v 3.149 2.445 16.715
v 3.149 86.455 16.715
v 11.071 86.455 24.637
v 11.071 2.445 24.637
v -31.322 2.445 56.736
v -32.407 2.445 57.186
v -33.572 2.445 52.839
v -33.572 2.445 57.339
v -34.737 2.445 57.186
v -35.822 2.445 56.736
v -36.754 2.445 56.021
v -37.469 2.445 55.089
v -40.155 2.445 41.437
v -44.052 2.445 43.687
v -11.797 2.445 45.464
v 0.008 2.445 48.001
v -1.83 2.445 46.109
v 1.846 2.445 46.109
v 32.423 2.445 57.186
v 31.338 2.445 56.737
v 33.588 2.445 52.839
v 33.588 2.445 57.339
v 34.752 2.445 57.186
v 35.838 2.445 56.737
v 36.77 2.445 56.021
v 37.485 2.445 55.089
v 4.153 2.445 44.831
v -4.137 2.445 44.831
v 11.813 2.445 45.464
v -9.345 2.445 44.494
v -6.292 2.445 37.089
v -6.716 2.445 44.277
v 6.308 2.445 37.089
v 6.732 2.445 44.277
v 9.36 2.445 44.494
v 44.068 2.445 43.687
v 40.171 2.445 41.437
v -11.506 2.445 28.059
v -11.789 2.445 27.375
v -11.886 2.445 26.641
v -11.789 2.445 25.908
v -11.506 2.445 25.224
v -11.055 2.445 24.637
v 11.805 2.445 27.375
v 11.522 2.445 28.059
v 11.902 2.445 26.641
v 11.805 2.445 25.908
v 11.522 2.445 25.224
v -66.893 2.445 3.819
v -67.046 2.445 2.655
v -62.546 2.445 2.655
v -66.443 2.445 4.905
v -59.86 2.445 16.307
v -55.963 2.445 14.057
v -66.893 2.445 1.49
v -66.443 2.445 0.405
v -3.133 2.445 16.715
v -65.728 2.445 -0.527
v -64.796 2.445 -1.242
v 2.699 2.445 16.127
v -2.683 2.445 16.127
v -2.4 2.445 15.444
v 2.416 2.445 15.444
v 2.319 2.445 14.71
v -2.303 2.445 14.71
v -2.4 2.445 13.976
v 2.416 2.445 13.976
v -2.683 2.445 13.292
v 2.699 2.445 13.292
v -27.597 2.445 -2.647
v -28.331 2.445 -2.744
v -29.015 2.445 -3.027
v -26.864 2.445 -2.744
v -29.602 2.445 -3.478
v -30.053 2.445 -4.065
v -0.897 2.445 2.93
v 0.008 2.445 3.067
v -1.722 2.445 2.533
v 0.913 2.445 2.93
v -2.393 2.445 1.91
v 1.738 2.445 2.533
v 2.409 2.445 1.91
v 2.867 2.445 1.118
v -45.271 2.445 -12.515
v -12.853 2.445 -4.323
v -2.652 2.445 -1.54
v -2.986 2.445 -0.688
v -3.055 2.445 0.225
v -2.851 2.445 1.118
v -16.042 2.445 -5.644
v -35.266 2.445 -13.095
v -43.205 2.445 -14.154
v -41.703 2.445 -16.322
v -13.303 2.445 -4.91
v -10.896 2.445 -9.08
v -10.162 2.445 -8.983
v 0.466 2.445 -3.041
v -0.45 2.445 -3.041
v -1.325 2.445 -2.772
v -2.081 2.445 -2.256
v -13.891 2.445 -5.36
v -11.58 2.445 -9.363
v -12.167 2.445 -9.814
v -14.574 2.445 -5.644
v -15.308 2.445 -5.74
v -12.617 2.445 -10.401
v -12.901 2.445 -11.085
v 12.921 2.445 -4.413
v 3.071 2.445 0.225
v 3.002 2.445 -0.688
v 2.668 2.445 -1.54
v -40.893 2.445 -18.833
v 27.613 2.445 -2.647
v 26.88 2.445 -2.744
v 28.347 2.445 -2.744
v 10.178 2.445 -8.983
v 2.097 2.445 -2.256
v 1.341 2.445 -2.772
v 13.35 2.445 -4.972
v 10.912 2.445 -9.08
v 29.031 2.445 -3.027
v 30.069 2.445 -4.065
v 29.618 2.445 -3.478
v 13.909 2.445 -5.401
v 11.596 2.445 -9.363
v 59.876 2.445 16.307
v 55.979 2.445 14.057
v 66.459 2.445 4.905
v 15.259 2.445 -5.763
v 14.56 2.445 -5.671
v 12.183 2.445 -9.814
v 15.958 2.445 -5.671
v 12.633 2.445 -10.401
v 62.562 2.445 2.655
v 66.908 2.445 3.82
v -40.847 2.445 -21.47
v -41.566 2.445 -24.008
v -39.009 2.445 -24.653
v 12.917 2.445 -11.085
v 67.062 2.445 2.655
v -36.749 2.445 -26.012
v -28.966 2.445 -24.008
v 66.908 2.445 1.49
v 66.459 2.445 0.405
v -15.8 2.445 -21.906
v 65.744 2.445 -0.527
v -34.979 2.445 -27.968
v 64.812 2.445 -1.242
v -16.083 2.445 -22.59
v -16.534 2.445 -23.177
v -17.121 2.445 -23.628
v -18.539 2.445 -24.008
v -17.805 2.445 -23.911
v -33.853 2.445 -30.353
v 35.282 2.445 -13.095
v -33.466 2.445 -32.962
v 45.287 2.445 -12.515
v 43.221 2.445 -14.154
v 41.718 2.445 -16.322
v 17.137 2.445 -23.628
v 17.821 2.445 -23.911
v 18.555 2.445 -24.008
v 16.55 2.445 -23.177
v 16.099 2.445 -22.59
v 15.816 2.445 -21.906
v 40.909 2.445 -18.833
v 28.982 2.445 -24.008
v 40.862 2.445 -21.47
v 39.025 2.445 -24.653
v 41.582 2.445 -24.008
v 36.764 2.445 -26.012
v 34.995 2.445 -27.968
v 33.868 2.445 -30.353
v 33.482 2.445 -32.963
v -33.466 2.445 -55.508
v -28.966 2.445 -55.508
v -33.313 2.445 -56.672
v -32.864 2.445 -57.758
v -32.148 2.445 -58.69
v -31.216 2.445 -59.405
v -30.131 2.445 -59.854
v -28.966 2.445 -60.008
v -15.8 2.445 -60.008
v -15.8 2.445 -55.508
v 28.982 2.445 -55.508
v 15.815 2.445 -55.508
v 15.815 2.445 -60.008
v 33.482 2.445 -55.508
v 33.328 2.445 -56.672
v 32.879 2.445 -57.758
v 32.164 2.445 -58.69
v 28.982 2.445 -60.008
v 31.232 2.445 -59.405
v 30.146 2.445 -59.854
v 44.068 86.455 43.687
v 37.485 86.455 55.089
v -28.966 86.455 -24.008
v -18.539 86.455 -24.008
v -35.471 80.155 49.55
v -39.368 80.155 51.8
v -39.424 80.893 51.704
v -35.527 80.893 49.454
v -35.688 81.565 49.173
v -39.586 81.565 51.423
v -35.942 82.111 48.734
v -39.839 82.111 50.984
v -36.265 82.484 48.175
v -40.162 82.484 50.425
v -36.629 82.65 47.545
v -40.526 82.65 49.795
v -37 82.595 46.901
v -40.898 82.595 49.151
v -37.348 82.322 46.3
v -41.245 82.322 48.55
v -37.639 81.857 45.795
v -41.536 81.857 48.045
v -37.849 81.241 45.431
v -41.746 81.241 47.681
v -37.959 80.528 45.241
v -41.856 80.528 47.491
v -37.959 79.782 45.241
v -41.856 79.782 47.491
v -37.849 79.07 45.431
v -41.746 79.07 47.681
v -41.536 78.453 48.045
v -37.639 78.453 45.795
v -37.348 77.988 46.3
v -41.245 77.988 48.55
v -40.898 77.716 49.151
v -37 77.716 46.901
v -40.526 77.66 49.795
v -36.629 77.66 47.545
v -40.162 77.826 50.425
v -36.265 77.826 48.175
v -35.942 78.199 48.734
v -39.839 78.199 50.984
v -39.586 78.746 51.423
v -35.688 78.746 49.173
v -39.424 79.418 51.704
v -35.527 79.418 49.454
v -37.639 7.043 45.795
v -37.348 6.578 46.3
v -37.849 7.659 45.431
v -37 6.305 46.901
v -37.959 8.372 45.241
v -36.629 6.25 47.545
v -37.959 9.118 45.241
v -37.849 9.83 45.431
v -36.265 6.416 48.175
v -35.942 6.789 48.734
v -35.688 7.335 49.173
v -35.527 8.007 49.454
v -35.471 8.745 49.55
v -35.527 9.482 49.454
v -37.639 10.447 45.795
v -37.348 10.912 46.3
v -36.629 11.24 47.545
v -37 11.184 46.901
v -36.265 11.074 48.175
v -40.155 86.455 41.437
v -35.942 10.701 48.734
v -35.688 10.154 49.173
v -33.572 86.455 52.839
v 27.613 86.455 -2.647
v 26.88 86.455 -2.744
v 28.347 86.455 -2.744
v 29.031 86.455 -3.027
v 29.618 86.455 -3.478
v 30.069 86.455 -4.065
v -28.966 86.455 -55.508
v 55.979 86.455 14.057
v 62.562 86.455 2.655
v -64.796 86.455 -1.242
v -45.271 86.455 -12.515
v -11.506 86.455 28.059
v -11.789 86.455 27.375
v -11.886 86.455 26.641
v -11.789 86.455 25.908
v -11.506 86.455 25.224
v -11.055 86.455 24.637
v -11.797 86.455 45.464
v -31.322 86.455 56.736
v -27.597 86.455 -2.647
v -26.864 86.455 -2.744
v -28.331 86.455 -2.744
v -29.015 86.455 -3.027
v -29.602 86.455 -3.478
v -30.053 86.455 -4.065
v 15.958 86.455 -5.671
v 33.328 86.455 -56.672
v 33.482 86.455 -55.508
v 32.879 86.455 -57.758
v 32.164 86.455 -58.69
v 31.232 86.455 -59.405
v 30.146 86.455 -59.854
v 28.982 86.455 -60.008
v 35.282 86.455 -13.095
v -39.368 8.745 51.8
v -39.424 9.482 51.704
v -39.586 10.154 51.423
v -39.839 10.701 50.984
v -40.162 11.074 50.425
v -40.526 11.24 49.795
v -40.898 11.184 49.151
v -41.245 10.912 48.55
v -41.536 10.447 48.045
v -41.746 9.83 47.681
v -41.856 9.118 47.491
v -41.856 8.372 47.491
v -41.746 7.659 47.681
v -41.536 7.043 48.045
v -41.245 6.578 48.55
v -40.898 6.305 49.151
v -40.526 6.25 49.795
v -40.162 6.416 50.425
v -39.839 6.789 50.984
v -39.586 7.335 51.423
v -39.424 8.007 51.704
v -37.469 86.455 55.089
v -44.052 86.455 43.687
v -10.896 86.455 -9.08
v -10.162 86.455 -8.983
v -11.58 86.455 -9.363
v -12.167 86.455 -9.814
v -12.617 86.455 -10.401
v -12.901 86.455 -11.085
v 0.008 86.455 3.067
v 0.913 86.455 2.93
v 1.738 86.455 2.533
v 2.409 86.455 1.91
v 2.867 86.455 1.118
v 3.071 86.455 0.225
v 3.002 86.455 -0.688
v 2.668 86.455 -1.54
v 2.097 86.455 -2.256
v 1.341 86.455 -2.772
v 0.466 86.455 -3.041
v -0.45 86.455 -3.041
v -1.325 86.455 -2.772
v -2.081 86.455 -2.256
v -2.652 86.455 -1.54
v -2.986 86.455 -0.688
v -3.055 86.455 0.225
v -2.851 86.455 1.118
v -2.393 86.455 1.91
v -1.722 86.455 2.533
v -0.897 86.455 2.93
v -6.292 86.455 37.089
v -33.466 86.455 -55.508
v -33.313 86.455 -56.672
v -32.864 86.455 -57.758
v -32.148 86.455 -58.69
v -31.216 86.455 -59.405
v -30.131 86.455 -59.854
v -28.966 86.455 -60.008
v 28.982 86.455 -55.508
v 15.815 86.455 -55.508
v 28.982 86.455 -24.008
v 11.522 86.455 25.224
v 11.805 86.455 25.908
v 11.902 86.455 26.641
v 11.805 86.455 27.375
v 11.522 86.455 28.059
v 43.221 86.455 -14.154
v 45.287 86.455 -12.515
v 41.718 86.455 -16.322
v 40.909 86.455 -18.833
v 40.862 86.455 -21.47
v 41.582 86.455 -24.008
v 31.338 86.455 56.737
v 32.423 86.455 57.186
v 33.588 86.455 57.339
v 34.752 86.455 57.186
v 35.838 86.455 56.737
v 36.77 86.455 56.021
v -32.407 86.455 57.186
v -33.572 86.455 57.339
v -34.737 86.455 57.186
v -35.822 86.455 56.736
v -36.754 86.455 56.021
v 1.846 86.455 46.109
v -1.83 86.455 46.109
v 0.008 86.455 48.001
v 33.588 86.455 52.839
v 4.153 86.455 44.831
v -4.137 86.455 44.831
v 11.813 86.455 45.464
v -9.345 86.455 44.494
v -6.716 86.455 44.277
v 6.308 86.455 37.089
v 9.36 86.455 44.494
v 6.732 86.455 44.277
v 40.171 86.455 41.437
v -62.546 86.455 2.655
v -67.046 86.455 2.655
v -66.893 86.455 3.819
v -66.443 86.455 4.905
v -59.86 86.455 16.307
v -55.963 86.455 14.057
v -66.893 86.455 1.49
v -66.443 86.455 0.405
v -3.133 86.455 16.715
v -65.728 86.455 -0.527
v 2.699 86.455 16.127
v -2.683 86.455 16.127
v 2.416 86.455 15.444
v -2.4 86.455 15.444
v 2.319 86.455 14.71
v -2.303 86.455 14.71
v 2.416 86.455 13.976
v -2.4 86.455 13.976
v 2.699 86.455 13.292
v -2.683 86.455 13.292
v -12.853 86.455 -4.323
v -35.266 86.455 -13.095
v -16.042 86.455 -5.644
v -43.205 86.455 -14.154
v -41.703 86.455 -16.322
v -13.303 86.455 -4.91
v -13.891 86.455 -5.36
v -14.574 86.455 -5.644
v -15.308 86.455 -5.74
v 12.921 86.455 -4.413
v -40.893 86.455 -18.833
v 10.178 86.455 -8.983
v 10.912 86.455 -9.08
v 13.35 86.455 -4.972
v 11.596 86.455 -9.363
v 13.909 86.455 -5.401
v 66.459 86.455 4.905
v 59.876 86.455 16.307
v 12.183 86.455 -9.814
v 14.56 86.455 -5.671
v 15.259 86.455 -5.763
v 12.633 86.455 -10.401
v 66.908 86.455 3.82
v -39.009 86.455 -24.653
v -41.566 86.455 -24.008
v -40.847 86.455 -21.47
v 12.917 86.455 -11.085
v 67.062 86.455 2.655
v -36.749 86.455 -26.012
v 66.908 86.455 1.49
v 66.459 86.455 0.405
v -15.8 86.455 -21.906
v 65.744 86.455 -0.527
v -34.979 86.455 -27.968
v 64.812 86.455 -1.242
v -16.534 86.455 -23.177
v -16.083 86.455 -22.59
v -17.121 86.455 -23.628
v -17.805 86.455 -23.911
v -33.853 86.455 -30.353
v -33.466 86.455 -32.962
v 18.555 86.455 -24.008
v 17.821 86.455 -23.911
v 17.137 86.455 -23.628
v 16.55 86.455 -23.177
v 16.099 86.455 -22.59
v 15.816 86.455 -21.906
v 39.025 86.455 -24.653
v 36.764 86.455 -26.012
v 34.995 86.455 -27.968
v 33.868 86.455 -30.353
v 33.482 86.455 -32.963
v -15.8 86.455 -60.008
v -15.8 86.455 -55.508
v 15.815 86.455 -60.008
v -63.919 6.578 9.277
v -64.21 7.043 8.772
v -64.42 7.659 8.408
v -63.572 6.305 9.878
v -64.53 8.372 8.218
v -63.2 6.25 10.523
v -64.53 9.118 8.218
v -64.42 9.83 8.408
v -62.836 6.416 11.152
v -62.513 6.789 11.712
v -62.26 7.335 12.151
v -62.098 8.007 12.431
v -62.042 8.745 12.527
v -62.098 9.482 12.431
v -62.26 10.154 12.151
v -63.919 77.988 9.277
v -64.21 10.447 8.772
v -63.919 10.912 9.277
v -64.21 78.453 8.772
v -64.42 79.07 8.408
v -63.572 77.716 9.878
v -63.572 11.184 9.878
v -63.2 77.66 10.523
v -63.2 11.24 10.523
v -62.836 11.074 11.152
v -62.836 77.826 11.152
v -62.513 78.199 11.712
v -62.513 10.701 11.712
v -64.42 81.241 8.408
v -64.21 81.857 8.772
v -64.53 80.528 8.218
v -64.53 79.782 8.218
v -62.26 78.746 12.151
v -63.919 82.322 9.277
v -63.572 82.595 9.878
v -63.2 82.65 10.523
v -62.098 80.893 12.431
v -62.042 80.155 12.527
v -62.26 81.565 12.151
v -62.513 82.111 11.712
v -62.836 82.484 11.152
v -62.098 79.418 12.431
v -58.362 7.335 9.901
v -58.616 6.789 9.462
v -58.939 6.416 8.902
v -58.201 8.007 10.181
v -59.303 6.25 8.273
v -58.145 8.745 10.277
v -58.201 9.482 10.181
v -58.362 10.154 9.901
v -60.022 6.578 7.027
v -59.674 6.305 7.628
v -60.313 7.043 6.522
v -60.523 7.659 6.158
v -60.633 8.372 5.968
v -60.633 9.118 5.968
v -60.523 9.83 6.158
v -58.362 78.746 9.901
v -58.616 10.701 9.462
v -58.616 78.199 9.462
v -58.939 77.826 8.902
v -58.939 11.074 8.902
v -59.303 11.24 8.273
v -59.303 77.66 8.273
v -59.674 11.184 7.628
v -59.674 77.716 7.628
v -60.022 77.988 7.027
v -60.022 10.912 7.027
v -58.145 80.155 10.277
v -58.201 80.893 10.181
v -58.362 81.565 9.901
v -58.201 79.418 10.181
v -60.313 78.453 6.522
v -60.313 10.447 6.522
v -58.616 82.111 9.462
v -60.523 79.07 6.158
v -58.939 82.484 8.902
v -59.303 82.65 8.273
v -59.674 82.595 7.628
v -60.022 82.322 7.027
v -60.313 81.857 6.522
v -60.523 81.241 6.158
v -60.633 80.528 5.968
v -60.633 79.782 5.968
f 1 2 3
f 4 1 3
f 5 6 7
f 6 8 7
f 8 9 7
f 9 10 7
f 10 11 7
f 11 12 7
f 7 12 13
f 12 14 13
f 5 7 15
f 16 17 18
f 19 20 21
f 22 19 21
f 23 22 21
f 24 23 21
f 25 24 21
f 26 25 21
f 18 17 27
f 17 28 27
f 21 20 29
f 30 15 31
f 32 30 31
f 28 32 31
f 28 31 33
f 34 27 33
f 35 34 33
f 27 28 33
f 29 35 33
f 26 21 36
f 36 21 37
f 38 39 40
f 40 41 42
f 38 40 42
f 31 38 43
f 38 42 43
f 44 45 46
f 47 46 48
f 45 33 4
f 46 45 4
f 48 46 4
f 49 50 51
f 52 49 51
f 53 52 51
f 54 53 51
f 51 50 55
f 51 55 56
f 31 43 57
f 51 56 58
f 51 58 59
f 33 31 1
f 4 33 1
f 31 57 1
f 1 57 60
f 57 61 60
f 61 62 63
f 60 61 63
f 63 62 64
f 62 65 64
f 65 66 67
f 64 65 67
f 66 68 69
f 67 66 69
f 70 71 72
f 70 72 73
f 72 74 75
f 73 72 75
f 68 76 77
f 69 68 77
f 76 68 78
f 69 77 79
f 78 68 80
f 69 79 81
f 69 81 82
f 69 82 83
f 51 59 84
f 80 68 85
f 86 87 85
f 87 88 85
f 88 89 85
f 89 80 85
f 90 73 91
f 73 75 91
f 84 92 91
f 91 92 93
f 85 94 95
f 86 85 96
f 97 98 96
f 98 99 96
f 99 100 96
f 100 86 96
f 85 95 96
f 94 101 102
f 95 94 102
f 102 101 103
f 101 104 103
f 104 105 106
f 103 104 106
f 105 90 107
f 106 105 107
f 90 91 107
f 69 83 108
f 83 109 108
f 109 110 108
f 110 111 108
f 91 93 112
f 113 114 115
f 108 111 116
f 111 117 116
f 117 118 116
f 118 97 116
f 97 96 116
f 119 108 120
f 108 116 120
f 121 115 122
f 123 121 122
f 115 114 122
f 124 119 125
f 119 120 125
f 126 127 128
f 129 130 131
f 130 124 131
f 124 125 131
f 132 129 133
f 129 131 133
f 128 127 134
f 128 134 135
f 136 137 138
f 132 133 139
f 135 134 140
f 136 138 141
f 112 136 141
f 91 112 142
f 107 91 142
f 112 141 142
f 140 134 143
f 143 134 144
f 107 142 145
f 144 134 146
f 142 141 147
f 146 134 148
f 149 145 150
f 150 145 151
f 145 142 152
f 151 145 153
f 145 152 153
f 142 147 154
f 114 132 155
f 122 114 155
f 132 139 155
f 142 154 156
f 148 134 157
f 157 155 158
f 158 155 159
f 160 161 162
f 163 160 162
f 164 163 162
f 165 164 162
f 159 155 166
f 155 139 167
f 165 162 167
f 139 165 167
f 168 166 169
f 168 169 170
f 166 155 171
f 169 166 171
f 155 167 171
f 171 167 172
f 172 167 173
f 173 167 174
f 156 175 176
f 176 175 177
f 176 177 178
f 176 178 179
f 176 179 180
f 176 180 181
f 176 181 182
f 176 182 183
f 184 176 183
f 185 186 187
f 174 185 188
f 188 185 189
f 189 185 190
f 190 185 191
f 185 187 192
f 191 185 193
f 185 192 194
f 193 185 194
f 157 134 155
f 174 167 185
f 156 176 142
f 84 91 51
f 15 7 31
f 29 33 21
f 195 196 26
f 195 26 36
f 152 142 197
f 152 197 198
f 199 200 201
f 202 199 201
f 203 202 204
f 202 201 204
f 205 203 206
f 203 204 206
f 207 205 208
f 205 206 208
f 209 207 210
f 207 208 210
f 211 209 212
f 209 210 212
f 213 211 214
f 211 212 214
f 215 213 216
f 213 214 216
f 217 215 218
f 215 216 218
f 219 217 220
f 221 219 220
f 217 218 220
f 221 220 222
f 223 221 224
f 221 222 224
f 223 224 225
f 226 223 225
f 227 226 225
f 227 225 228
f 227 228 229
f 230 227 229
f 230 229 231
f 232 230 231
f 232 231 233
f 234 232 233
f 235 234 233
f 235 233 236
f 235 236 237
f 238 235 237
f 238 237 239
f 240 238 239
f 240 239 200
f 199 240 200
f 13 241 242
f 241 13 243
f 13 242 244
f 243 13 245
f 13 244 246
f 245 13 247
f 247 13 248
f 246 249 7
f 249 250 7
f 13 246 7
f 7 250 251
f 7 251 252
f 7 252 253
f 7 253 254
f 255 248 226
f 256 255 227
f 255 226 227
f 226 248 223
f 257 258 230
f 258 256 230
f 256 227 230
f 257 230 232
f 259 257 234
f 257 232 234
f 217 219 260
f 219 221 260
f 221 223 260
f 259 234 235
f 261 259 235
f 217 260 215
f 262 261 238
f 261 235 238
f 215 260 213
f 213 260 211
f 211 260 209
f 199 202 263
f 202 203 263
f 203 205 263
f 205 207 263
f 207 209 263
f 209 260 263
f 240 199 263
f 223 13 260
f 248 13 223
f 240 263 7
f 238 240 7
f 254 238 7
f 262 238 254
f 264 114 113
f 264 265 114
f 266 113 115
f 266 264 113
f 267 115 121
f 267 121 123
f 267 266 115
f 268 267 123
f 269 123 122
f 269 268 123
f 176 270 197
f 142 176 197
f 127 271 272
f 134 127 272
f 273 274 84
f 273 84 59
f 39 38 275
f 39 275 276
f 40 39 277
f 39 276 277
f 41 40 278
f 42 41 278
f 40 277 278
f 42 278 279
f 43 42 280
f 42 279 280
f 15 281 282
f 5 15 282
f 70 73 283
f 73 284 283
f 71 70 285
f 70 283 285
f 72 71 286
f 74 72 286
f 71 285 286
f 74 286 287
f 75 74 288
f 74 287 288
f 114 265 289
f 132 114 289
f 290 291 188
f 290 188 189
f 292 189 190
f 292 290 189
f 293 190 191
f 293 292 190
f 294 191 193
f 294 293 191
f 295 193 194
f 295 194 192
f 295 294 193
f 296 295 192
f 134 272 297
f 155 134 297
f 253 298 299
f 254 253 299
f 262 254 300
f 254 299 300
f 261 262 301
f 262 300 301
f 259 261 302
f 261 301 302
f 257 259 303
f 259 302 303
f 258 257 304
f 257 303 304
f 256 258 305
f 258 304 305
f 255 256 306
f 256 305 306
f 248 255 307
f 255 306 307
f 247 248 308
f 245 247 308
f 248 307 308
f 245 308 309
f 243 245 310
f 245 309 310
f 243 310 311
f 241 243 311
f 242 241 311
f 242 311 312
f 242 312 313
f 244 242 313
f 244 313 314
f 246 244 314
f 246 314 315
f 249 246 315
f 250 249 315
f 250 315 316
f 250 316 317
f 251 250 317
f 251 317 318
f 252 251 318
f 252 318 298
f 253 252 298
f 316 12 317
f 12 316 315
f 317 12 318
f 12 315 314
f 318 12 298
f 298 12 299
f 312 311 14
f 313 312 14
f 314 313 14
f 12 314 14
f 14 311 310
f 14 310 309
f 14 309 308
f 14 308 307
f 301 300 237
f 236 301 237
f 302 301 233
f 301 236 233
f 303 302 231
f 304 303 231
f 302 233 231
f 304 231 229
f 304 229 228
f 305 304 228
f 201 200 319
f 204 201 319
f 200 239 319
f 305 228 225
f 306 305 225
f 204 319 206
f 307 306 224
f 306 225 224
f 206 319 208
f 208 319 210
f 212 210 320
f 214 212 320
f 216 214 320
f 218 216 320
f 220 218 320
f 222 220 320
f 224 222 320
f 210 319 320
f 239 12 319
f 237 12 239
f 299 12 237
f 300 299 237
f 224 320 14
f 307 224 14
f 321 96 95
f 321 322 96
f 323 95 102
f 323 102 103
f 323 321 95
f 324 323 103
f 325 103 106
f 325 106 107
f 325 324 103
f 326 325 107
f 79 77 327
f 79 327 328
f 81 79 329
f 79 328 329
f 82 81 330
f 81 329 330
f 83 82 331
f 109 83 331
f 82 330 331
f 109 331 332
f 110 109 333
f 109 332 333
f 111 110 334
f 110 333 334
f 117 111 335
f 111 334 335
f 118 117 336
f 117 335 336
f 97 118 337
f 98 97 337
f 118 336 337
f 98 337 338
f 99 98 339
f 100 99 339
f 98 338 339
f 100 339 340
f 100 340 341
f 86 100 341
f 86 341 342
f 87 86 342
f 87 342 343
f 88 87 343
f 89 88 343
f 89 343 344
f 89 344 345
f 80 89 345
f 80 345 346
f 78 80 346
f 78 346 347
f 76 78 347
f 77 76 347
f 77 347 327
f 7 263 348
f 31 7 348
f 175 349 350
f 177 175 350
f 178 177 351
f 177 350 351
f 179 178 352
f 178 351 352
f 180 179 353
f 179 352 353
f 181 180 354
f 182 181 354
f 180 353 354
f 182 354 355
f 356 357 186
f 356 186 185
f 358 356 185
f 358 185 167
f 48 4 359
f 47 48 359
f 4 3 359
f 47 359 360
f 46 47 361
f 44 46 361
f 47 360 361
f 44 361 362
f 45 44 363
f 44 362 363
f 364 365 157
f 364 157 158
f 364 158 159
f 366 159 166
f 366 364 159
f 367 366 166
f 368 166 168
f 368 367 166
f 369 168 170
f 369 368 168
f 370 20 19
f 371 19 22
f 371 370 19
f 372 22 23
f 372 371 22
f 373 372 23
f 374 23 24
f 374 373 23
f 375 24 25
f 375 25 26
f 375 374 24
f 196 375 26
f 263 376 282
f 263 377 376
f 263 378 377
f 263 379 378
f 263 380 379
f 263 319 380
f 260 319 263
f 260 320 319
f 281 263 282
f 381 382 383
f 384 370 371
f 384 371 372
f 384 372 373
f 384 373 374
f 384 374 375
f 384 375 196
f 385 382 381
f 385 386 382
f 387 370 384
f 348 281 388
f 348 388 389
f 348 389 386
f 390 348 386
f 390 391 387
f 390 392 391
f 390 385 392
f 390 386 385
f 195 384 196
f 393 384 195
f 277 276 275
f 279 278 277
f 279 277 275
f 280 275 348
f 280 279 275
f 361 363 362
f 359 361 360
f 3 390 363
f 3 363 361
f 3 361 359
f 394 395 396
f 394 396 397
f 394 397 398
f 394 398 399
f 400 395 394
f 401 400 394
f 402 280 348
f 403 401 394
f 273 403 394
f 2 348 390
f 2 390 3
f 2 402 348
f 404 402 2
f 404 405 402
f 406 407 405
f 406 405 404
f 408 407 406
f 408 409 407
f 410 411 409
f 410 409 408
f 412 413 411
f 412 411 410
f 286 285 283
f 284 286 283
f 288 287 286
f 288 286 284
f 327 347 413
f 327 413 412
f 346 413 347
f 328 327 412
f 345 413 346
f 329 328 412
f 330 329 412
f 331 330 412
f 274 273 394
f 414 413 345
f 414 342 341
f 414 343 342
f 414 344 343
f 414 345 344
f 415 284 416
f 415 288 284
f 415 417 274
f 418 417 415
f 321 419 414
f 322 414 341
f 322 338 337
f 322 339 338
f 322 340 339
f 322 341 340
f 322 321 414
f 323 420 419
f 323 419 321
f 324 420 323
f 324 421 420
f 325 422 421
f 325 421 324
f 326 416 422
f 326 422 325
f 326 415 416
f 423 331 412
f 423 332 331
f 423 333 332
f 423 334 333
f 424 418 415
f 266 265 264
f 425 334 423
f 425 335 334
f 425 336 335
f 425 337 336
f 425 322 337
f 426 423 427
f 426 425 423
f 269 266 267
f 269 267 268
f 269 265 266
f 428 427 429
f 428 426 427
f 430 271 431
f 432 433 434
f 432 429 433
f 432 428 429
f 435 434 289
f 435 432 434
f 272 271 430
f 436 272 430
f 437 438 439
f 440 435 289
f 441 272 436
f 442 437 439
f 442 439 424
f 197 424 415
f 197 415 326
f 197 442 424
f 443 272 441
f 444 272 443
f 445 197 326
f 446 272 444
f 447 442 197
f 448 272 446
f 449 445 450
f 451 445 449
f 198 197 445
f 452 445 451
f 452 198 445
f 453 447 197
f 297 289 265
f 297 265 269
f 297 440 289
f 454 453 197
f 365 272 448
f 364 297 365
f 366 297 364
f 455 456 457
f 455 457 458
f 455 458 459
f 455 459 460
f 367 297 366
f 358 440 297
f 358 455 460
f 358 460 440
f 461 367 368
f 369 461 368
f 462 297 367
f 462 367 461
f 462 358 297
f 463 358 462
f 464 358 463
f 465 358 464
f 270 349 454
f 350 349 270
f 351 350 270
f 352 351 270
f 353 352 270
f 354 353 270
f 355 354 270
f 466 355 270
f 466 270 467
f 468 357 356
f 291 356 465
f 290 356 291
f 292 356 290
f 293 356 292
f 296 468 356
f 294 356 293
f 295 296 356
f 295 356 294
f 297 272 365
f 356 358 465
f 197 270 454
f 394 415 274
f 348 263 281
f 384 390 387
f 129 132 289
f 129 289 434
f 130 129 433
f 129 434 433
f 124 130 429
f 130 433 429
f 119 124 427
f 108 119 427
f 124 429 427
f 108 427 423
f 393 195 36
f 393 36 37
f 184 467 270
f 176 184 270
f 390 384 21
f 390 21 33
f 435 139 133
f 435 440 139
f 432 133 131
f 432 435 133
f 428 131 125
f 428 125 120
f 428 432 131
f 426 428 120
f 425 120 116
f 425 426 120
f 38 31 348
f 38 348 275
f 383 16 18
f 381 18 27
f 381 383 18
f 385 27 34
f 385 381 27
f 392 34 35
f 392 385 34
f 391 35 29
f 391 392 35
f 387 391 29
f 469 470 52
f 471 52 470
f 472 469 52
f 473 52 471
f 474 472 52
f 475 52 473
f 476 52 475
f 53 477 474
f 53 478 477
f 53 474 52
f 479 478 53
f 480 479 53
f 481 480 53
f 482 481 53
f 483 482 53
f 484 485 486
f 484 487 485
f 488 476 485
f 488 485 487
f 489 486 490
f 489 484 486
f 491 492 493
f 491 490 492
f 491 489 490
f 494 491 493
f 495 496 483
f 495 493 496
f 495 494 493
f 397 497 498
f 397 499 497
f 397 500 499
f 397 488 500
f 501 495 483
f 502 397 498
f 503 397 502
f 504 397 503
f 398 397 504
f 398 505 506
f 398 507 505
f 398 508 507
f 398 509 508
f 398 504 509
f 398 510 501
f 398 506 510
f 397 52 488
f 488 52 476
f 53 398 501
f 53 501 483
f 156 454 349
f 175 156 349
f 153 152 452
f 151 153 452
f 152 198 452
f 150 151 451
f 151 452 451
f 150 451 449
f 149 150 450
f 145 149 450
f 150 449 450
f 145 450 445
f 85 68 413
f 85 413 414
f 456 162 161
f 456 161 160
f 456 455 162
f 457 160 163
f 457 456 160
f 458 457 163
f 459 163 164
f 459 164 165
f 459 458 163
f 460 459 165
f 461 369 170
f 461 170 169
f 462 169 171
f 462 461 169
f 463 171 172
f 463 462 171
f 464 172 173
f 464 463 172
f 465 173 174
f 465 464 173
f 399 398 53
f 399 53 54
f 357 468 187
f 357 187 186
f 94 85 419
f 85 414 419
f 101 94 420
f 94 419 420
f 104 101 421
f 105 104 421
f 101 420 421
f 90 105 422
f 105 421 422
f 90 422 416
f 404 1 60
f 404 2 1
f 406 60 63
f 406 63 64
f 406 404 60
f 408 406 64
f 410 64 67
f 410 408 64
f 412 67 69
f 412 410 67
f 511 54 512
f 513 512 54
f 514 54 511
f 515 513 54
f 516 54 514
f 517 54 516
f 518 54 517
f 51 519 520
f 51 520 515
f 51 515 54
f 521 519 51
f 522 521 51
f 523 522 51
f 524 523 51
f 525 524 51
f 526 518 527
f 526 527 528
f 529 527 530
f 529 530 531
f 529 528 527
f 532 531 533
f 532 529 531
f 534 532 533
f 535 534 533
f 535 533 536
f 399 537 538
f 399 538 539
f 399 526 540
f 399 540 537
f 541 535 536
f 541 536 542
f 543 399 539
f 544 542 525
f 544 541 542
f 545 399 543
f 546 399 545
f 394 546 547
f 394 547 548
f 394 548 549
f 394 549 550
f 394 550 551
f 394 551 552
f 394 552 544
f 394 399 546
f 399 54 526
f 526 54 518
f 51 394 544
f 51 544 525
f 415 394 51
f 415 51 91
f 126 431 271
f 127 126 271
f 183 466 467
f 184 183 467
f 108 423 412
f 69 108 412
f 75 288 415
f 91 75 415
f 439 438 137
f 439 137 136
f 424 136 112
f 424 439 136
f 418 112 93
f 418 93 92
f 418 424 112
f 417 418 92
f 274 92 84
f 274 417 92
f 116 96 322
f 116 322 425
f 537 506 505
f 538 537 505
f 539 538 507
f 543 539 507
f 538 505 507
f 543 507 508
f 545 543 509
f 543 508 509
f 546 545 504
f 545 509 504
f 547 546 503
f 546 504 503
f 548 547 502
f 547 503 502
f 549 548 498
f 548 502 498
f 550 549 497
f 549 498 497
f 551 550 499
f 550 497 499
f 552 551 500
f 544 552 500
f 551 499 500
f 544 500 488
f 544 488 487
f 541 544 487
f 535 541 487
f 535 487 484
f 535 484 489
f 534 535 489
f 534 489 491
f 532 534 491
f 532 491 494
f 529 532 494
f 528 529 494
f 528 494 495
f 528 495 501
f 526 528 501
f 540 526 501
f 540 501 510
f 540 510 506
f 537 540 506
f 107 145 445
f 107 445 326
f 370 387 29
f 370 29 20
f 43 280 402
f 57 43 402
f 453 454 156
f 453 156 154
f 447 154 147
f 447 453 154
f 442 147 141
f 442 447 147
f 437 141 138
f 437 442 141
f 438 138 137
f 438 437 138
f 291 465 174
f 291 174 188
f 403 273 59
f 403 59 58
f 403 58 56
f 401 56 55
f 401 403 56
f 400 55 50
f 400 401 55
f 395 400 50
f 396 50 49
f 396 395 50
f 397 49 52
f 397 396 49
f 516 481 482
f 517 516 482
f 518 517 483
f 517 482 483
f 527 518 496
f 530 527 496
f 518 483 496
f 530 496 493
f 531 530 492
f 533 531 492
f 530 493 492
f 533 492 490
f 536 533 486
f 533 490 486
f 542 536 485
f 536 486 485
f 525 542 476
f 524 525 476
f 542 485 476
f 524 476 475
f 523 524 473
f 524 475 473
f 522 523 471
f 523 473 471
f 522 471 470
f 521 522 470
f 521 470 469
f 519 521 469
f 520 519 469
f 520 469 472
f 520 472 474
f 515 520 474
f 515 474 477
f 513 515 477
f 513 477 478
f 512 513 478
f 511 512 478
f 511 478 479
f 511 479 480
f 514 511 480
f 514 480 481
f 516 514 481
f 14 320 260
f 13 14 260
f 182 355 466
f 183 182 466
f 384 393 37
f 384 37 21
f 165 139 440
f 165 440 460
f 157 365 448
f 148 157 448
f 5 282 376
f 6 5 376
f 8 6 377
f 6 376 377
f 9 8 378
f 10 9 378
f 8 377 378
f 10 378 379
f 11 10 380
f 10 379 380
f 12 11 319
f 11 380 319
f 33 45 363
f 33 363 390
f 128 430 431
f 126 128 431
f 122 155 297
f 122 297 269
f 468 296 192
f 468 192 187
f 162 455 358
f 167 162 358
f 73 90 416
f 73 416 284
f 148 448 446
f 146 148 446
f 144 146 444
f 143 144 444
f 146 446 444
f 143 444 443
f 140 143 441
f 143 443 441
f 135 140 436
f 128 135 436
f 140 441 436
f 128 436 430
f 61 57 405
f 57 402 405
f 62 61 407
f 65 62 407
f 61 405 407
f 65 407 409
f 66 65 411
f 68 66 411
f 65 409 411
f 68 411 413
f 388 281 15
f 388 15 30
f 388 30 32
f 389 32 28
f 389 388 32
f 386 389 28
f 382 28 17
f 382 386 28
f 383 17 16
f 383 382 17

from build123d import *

# Parameters (mm, degrees)
SALIENTE_EXTRUIR1_DEPTH = 88.9
CROQUIS4_R              = 3.25
CORTAR_EXTRUIR1_DEPTH   = 112.44204772
REDONDEO6_R             = 3
REDONDEO7_R             = 3
ESCALA2_SCALE           = 1.05
SALIENTE_EXTRUIR2_DEPTH = 93.345
REDONDEO8_R             = 10
REDONDEO9_R             = 10
REDONDEO12_R            = 10
REDONDEO13_R            = 10
REDONDEO14_R            = 10
REDONDEO16_R            = 10
REDONDEO17_R            = 3
CROQUIS20_R             = 2.78
CORTAR_EXTRUIR7_DEPTH   = 10
ESCALA3_SCALE           = 0.9


with BuildPart() as part:
    # Croquis1 → Saliente-Extruir1 (new body)
    with BuildSketch(Plane(origin=(0, 0, 0), x_dir=(1, 0, 0), z_dir=(0, 1, 0))):
        Polygon((1.696358741, -16.064461222), (13.335, -27.703102481), (0, -50.8), (-13.335, -27.703102481), (-1.696358741, -16.064461222), (-14.760410887, 6.563140847), (-30.659090512, 2.303102481), (-43.994090512, 25.4), (-17.324090512, 25.4), (-13.064052146, 9.501320374), (13.064052146, 9.501320374), (17.324090512, 25.4), (43.994090512, 25.4), (30.659090512, 2.303102481), (14.760410887, 6.563140847), align=None)
    extrude(amount=SALIENTE_EXTRUIR1_DEPTH)

    # Croquis4 → Cortar-Extruir1 (cut, through all)
    with BuildSketch(Plane(origin=(0, 88.9, 0), x_dir=(1, 0, 0), z_dir=(0, 1, 0))):
        with Locations(Location((0, 0, 0), (0, 0, 270))):
            Circle(CROQUIS4_R)
    extrude(amount=-CORTAR_EXTRUIR1_DEPTH, mode=Mode.SUBTRACT)

    # Redondeo6
    redondeo6_edges = [part.edges().sort_by_distance(p)[0] for p in [
        (-1.696358741, 44.45, 16.064461222),
        (-14.760410887, 44.45, -6.563140847),
        (-13.064052146, 44.45, -9.501320374),
        (13.064052146, 44.45, -9.501320374),
        (1.696358741, 44.45, 16.064461222),
    ]]
    fillet(redondeo6_edges, radius=REDONDEO6_R)

    # Redondeo7
    redondeo7_edges = [part.edges().sort_by_distance(p)[0] for p in [
        (-13.335, 44.45, 27.703102481),
        (-30.659090512, 44.45, -2.303102481),
        (-17.324090512, 44.45, -25.4),
        (17.324090512, 44.45, -25.4),
        (30.659090512, 44.45, -2.303102481),
        (13.335, 44.45, 27.703102481),
    ]]
    fillet(redondeo7_edges, radius=REDONDEO7_R)


with BuildPart() as part_1:
    # Escala2: scaled about (-0.00814633, 44.45, 0.003262785)
    add(part.part.scale(ESCALA2_SCALE).moved(Location((0.000407317, -2.2225, -0.000163139))))

    # Croquis9 → Saliente-Extruir2 (add, through all)
    with BuildSketch(Plane(origin=(0, 91.1225, 0), x_dir=(1, 0, 0), z_dir=(0, 1, 0))):
        with BuildLine():
            Line((-37.193388788, 26.670163139), (-37.193388788, 61.670162712))
            ThreePointArc((-37.193388788, 61.670162712), (-35.728922694, 65.205696618), (-32.193388788, 66.670162712))
            Line((-32.193388788, 66.670162712), (-17.564301381, 66.670162712))
            Line((-17.564301381, 66.670162712), (-17.564301381, 61.670162712))
            Line((-17.564301381, 61.670162712), (-32.193388788, 61.670162712))
            Line((-32.193388788, 61.670162712), (-32.193388788, 26.670163139))
            Line((-32.193388788, 26.670163139), (-37.193388788, 26.670163139))
        make_face()
        with BuildLine():
            Line((-69.504104547, -2.954490104), (-39.193215784, 14.545509683))
            Line((-39.193215784, 14.545509683), (-41.693215784, 18.875636702))
            Line((-41.693215784, 18.875636702), (-72.004104547, 1.375636915))
            ThreePointArc((-72.004104547, 1.375636915), (-74.333733678, -1.660394878), (-73.834231566, -5.454490104))
            Line((-73.834231566, -5.454490104), (-66.519687862, -18.123651433))
            Line((-66.519687862, -18.123651433), (-62.189560843, -15.623651433))
            Line((-62.189560843, -15.623651433), (-69.504104547, -2.954490104))
        make_face()
        with BuildLine():
            Line((32.193388788, 61.670162712), (32.193388788, 26.670163139))
            Line((32.193388788, 26.670163139), (37.193388788, 26.670163139))
            Line((37.193388788, 26.670163139), (37.193388788, 61.670162712))
            ThreePointArc((37.193388788, 61.670162712), (35.728922694, 65.205696618), (32.193388788, 66.670162712))
            Line((32.193388788, 66.670162712), (17.564301381, 66.670162712))
            Line((17.564301381, 66.670162712), (17.564301381, 61.670162712))
            Line((17.564301381, 61.670162712), (32.193388788, 61.670162712))
        make_face()
        with BuildLine():
            Line((39.193733196, 14.545210955), (41.693733196, 18.875337974))
            Line((41.693733196, 18.875337974), (72.004621958, 1.375338188))
            ThreePointArc((72.004621958, 1.375338188), (74.33425109, -1.660693606), (73.834748977, -5.454788831))
            Line((73.834748977, -5.454788831), (66.520205273, -18.123950161))
            Line((66.520205273, -18.123950161), (62.190078254, -15.623950161))
            Line((62.190078254, -15.623950161), (69.504621958, -2.954788831))
            Line((69.504621958, -2.954788831), (39.193733196, 14.545210955))
        make_face()
        with BuildLine():
            Line((37.31123317, -58.715373881), (7.000344407, -41.215374094))
            Line((7.000344407, -41.215374094), (4.500344407, -45.545501113))
            Line((4.500344407, -45.545501113), (34.81123317, -63.0455009))
            ThreePointArc((34.81123317, -63.0455009), (38.605328395, -63.545003012), (41.641360189, -61.215373881))
            Line((41.641360189, -61.215373881), (48.955903893, -48.546212551))
            Line((48.955903893, -48.546212551), (44.625776874, -46.046212551))
            Line((44.625776874, -46.046212551), (37.31123317, -58.715373881))
        make_face()
        with BuildLine():
            Line((-6.999826996, -41.215075367), (-4.499826996, -45.545202386))
            Line((-4.499826996, -45.545202386), (-34.810715758, -63.045202172))
            ThreePointArc((-34.810715758, -63.045202172), (-38.604810984, -63.544704284), (-41.640842777, -61.215075153))
            Line((-41.640842777, -61.215075153), (-48.955386481, -48.545913824))
            Line((-48.955386481, -48.545913824), (-44.625259462, -46.045913824))
            Line((-44.625259462, -46.045913824), (-37.310715758, -58.715075153))
            Line((-37.310715758, -58.715075153), (-6.999826996, -41.215075367))
        make_face()
    extrude(amount=-SALIENTE_EXTRUIR2_DEPTH)

    # Redondeo8
    # the kernel refuses this fillet: 10 mm, written as the material it adds along each edge
    with BuildSketch(Plane(origin=(-37.193388788, 91.1225, -26.670163139), x_dir=(-1, 0, 0), z_dir=(0, -1, 0))) as redondeo8_piece_1_section:
        with BuildLine():
            CenterArc((10, 9.949874264), REDONDEO8_R, 180, 84.260823378)
            Line((0, 9.949874264), (-0.2, 9.949874264))
            Line((-0.2, 9.949874264), (-0.2, 0))
            Line((-0.2, 0), (0, -0.2))
            ThreePointArc((0, -0.2), (4.499999466, -0.2), (8.979998912, -0.198997485))
            Line((8.979998912, -0.198997485), (8.999998933, 0))
        make_face()
    redondeo8_piece_1 = extrude(amount=93.345, mode=Mode.PRIVATE)
    redondeo8_piece_1 = split(redondeo8_piece_1, bisect_by=Plane(origin=(-45.471806186, 44.45, -25.420347259), z_dir=(0.8660254037844427, 0, -0.49999999999999306)), keep=Keep.TOP, mode=Mode.PRIVATE)
    add(redondeo8_piece_1)

    # Redondeo9
    # the kernel refuses this fillet: 10 mm, written as the material it adds along each edge
    with BuildSketch(Plane(origin=(37.193388788, 91.1225, -26.670163139), x_dir=(0, 0, -1), z_dir=(0, -1, 0))) as redondeo9_piece_1_section:
        with BuildLine():
            CenterArc((9.949956104, 10), REDONDEO9_R, 185.734485624, 84.265514376)
            Line((0, 9.000813566), (-0.198999122, 8.980829837))
            ThreePointArc((-0.198999122, 8.980829837), (-0.2, 4.500406783), (-0.2, 0))
            Line((-0.2, 0), (0, -0.2))
            Line((0, -0.2), (9.949956104, -0.2))
            Line((9.949956104, -0.2), (9.949956104, 0))
        make_face()
    redondeo9_piece_1 = extrude(amount=93.345, mode=Mode.PRIVATE)
    redondeo9_piece_1 = split(redondeo9_piece_1, bisect_by=Plane(origin=(45.472441412, 44.45, -25.420036516), z_dir=(-0.8660254037844312, 0, -0.5000000000000131)), keep=Keep.TOP, mode=Mode.PRIVATE)
    add(redondeo9_piece_1)

    # Redondeo12
    # the kernel refuses this fillet: 10 mm, written as the material it adds along each edge
    with BuildSketch(Plane(origin=(4.500437971, 91.1225, 45.545555132), x_dir=(0.8660254037844384, 0, 0.5000000000000003), z_dir=(0, -1, 0))) as redondeo12_piece_1_section:
        with BuildLine():
            CenterArc((9.949880533, 10), REDONDEO12_R, 185.738817437, 84.261182563)
            Line((0, 9.000061308), (-0.198997611, 8.980062535))
            ThreePointArc((-0.198997611, 8.980062535), (-0.2, 4.500030654), (-0.2, 0))
            Line((-0.2, 0), (0, -0.2))
            Line((0, -0.2), (9.949880533, -0.2))
            Line((9.949880533, -0.2), (9.949880533, 0))
        make_face()
    redondeo12_piece_1 = extrude(amount=93.345, mode=Mode.PRIVATE)
    redondeo12_piece_1 = split(redondeo12_piece_1, bisect_by=Plane(origin=(-0.721187955, 44.45, 52.089997188), z_dir=(0.8660254037844385, 0, -0.5000000000000004)), keep=Keep.TOP, mode=Mode.PRIVATE)
    add(redondeo12_piece_1)

    # Redondeo13
    # the kernel refuses this fillet: 10 mm, written as the material it adds along each edge
    with BuildSketch(Plane(origin=(41.693826759, 91.1225, -18.875283955), x_dir=(0.500000000000013, 0, -0.8660254037844312), z_dir=(0, -1, 0))) as redondeo13_piece_1_section:
        with BuildLine():
            CenterArc((10, 9.94994984), REDONDEO13_R, 180, 84.265155193)
            Line((0, 9.94994984), (-0.2, 9.94994984))
            Line((-0.2, 9.94994984), (-0.2, 0))
            Line((-0.2, 0), (0, -0.2))
            ThreePointArc((0, -0.2), (4.500375595, -0.2), (8.980766214, -0.198998997))
            Line((8.980766214, -0.198998997), (9.00075119, 0))
        make_face()
    redondeo13_piece_1 = extrude(amount=93.345, mode=Mode.PRIVATE)
    redondeo13_piece_1 = redondeo13_piece_1 - Plane(origin=(47.193388788, 44.45, -36.620119243), x_dir=(0, 0, -1), z_dir=(0, 1, 0)) * Cylinder(10, 227, mode=Mode.PRIVATE)
    add(redondeo13_piece_1)

    # Redondeo14
    # the kernel refuses this fillet: 10 mm, written as the material it adds along each edge
    with BuildSketch(Plane(origin=(-4.499826996, 91.1225, 45.545202386), x_dir=(0.4999999999984365, 0, 0.8660254037853413), z_dir=(0, -1, 0))) as redondeo14_piece_1_section:
        with BuildLine():
            CenterArc((10, 9.949921458), REDONDEO14_R, 180, 84.263528066)
            Line((0, 9.949921459), (-0.2, 9.949921459))
            Line((-0.2, 9.949921459), (-0.2, 0))
            Line((-0.2, 0), (0, -0.2))
            ThreePointArc((0, -0.2), (4.500234312, -0.2), (8.980477997, -0.198998429))
            Line((8.980477997, -0.198998429), (9.000468625, 0))
        make_face()
    redondeo14_piece_1 = extrude(amount=93.345, mode=Mode.PRIVATE)
    redondeo14_piece_1 = redondeo14_piece_1 - Plane(origin=(8.117287277, 44.45, 59.180749436), x_dir=(0.866025403784329, 0, 0.50000000000019), z_dir=(0, 1, 0)) * Cylinder(10, 227, mode=Mode.PRIVATE)
    add(redondeo14_piece_1)

    # Redondeo16
    # the kernel refuses this fillet: 10 mm, written as the material it adds along each edge
    with BuildSketch(Plane(origin=(-41.693215784, 91.1225, -18.875636702), x_dir=(-0.8660254037844388, 0, 0.4999999999999999), z_dir=(0, -1, 0))) as redondeo16_piece_1_section:
        with BuildLine():
            CenterArc((9.949908926, 10), REDONDEO16_R, 185.737190303, 84.262809697)
            Line((0, 9.000343874), (-0.198998178, 8.980350751))
            ThreePointArc((-0.198998178, 8.980350751), (-0.2, 4.500171937), (-0.2, 0))
            Line((-0.2, 0), (0, -0.2))
            Line((0, -0.2), (9.949908926, -0.2))
            Line((9.949908926, -0.2), (9.949908926, 0))
        make_face()
    redondeo16_piece_1 = extrude(amount=93.345, mode=Mode.PRIVATE)
    redondeo16_piece_1 = redondeo16_piece_1 - Plane(origin=(-47.193388788, 44.45, -36.620037403), x_dir=(-1, 0, 0), z_dir=(0, 1, 0)) * Cylinder(10, 227, mode=Mode.PRIVATE)
    add(redondeo16_piece_1)

    # Redondeo17
    redondeo17_edges = [part_1.edges().sort_by_distance(p)[0] for p in [
        (15.498838747, 44.45, -6.891461029),
    ]]
    fillet(redondeo17_edges, radius=REDONDEO17_R)

    # Croquis20 → Cortar-Extruir7 (cut)
    with BuildSketch(Plane(origin=(-57.737537171, 0, 33.334782628), x_dir=(0.5000000000000017, 0, 0.8660254037844378), z_dir=(-0.8660254037844377, 0, 0.5000000000000016))):
        with Locations((25.193388788, 4.7775)):
            Circle(CROQUIS20_R)
        with Locations((25.193388788, 84.1225)):
            Circle(CROQUIS20_R)
        with Locations((-25.193388788, 84.1225)):
            Circle(CROQUIS20_R)
        with Locations((-25.193388788, 4.7775)):
            Circle(CROQUIS20_R)
    extrude(amount=-CORTAR_EXTRUIR7_DEPTH, mode=Mode.SUBTRACT)


with BuildPart() as part_2:
    # Escala3: scaled about (0.076174525, 44.45, -0.044030198)
    add(part_1.part.scale(ESCALA3_SCALE).moved(Location((0.007617452, 4.445, -0.00440302))))


solid = part_2.part
